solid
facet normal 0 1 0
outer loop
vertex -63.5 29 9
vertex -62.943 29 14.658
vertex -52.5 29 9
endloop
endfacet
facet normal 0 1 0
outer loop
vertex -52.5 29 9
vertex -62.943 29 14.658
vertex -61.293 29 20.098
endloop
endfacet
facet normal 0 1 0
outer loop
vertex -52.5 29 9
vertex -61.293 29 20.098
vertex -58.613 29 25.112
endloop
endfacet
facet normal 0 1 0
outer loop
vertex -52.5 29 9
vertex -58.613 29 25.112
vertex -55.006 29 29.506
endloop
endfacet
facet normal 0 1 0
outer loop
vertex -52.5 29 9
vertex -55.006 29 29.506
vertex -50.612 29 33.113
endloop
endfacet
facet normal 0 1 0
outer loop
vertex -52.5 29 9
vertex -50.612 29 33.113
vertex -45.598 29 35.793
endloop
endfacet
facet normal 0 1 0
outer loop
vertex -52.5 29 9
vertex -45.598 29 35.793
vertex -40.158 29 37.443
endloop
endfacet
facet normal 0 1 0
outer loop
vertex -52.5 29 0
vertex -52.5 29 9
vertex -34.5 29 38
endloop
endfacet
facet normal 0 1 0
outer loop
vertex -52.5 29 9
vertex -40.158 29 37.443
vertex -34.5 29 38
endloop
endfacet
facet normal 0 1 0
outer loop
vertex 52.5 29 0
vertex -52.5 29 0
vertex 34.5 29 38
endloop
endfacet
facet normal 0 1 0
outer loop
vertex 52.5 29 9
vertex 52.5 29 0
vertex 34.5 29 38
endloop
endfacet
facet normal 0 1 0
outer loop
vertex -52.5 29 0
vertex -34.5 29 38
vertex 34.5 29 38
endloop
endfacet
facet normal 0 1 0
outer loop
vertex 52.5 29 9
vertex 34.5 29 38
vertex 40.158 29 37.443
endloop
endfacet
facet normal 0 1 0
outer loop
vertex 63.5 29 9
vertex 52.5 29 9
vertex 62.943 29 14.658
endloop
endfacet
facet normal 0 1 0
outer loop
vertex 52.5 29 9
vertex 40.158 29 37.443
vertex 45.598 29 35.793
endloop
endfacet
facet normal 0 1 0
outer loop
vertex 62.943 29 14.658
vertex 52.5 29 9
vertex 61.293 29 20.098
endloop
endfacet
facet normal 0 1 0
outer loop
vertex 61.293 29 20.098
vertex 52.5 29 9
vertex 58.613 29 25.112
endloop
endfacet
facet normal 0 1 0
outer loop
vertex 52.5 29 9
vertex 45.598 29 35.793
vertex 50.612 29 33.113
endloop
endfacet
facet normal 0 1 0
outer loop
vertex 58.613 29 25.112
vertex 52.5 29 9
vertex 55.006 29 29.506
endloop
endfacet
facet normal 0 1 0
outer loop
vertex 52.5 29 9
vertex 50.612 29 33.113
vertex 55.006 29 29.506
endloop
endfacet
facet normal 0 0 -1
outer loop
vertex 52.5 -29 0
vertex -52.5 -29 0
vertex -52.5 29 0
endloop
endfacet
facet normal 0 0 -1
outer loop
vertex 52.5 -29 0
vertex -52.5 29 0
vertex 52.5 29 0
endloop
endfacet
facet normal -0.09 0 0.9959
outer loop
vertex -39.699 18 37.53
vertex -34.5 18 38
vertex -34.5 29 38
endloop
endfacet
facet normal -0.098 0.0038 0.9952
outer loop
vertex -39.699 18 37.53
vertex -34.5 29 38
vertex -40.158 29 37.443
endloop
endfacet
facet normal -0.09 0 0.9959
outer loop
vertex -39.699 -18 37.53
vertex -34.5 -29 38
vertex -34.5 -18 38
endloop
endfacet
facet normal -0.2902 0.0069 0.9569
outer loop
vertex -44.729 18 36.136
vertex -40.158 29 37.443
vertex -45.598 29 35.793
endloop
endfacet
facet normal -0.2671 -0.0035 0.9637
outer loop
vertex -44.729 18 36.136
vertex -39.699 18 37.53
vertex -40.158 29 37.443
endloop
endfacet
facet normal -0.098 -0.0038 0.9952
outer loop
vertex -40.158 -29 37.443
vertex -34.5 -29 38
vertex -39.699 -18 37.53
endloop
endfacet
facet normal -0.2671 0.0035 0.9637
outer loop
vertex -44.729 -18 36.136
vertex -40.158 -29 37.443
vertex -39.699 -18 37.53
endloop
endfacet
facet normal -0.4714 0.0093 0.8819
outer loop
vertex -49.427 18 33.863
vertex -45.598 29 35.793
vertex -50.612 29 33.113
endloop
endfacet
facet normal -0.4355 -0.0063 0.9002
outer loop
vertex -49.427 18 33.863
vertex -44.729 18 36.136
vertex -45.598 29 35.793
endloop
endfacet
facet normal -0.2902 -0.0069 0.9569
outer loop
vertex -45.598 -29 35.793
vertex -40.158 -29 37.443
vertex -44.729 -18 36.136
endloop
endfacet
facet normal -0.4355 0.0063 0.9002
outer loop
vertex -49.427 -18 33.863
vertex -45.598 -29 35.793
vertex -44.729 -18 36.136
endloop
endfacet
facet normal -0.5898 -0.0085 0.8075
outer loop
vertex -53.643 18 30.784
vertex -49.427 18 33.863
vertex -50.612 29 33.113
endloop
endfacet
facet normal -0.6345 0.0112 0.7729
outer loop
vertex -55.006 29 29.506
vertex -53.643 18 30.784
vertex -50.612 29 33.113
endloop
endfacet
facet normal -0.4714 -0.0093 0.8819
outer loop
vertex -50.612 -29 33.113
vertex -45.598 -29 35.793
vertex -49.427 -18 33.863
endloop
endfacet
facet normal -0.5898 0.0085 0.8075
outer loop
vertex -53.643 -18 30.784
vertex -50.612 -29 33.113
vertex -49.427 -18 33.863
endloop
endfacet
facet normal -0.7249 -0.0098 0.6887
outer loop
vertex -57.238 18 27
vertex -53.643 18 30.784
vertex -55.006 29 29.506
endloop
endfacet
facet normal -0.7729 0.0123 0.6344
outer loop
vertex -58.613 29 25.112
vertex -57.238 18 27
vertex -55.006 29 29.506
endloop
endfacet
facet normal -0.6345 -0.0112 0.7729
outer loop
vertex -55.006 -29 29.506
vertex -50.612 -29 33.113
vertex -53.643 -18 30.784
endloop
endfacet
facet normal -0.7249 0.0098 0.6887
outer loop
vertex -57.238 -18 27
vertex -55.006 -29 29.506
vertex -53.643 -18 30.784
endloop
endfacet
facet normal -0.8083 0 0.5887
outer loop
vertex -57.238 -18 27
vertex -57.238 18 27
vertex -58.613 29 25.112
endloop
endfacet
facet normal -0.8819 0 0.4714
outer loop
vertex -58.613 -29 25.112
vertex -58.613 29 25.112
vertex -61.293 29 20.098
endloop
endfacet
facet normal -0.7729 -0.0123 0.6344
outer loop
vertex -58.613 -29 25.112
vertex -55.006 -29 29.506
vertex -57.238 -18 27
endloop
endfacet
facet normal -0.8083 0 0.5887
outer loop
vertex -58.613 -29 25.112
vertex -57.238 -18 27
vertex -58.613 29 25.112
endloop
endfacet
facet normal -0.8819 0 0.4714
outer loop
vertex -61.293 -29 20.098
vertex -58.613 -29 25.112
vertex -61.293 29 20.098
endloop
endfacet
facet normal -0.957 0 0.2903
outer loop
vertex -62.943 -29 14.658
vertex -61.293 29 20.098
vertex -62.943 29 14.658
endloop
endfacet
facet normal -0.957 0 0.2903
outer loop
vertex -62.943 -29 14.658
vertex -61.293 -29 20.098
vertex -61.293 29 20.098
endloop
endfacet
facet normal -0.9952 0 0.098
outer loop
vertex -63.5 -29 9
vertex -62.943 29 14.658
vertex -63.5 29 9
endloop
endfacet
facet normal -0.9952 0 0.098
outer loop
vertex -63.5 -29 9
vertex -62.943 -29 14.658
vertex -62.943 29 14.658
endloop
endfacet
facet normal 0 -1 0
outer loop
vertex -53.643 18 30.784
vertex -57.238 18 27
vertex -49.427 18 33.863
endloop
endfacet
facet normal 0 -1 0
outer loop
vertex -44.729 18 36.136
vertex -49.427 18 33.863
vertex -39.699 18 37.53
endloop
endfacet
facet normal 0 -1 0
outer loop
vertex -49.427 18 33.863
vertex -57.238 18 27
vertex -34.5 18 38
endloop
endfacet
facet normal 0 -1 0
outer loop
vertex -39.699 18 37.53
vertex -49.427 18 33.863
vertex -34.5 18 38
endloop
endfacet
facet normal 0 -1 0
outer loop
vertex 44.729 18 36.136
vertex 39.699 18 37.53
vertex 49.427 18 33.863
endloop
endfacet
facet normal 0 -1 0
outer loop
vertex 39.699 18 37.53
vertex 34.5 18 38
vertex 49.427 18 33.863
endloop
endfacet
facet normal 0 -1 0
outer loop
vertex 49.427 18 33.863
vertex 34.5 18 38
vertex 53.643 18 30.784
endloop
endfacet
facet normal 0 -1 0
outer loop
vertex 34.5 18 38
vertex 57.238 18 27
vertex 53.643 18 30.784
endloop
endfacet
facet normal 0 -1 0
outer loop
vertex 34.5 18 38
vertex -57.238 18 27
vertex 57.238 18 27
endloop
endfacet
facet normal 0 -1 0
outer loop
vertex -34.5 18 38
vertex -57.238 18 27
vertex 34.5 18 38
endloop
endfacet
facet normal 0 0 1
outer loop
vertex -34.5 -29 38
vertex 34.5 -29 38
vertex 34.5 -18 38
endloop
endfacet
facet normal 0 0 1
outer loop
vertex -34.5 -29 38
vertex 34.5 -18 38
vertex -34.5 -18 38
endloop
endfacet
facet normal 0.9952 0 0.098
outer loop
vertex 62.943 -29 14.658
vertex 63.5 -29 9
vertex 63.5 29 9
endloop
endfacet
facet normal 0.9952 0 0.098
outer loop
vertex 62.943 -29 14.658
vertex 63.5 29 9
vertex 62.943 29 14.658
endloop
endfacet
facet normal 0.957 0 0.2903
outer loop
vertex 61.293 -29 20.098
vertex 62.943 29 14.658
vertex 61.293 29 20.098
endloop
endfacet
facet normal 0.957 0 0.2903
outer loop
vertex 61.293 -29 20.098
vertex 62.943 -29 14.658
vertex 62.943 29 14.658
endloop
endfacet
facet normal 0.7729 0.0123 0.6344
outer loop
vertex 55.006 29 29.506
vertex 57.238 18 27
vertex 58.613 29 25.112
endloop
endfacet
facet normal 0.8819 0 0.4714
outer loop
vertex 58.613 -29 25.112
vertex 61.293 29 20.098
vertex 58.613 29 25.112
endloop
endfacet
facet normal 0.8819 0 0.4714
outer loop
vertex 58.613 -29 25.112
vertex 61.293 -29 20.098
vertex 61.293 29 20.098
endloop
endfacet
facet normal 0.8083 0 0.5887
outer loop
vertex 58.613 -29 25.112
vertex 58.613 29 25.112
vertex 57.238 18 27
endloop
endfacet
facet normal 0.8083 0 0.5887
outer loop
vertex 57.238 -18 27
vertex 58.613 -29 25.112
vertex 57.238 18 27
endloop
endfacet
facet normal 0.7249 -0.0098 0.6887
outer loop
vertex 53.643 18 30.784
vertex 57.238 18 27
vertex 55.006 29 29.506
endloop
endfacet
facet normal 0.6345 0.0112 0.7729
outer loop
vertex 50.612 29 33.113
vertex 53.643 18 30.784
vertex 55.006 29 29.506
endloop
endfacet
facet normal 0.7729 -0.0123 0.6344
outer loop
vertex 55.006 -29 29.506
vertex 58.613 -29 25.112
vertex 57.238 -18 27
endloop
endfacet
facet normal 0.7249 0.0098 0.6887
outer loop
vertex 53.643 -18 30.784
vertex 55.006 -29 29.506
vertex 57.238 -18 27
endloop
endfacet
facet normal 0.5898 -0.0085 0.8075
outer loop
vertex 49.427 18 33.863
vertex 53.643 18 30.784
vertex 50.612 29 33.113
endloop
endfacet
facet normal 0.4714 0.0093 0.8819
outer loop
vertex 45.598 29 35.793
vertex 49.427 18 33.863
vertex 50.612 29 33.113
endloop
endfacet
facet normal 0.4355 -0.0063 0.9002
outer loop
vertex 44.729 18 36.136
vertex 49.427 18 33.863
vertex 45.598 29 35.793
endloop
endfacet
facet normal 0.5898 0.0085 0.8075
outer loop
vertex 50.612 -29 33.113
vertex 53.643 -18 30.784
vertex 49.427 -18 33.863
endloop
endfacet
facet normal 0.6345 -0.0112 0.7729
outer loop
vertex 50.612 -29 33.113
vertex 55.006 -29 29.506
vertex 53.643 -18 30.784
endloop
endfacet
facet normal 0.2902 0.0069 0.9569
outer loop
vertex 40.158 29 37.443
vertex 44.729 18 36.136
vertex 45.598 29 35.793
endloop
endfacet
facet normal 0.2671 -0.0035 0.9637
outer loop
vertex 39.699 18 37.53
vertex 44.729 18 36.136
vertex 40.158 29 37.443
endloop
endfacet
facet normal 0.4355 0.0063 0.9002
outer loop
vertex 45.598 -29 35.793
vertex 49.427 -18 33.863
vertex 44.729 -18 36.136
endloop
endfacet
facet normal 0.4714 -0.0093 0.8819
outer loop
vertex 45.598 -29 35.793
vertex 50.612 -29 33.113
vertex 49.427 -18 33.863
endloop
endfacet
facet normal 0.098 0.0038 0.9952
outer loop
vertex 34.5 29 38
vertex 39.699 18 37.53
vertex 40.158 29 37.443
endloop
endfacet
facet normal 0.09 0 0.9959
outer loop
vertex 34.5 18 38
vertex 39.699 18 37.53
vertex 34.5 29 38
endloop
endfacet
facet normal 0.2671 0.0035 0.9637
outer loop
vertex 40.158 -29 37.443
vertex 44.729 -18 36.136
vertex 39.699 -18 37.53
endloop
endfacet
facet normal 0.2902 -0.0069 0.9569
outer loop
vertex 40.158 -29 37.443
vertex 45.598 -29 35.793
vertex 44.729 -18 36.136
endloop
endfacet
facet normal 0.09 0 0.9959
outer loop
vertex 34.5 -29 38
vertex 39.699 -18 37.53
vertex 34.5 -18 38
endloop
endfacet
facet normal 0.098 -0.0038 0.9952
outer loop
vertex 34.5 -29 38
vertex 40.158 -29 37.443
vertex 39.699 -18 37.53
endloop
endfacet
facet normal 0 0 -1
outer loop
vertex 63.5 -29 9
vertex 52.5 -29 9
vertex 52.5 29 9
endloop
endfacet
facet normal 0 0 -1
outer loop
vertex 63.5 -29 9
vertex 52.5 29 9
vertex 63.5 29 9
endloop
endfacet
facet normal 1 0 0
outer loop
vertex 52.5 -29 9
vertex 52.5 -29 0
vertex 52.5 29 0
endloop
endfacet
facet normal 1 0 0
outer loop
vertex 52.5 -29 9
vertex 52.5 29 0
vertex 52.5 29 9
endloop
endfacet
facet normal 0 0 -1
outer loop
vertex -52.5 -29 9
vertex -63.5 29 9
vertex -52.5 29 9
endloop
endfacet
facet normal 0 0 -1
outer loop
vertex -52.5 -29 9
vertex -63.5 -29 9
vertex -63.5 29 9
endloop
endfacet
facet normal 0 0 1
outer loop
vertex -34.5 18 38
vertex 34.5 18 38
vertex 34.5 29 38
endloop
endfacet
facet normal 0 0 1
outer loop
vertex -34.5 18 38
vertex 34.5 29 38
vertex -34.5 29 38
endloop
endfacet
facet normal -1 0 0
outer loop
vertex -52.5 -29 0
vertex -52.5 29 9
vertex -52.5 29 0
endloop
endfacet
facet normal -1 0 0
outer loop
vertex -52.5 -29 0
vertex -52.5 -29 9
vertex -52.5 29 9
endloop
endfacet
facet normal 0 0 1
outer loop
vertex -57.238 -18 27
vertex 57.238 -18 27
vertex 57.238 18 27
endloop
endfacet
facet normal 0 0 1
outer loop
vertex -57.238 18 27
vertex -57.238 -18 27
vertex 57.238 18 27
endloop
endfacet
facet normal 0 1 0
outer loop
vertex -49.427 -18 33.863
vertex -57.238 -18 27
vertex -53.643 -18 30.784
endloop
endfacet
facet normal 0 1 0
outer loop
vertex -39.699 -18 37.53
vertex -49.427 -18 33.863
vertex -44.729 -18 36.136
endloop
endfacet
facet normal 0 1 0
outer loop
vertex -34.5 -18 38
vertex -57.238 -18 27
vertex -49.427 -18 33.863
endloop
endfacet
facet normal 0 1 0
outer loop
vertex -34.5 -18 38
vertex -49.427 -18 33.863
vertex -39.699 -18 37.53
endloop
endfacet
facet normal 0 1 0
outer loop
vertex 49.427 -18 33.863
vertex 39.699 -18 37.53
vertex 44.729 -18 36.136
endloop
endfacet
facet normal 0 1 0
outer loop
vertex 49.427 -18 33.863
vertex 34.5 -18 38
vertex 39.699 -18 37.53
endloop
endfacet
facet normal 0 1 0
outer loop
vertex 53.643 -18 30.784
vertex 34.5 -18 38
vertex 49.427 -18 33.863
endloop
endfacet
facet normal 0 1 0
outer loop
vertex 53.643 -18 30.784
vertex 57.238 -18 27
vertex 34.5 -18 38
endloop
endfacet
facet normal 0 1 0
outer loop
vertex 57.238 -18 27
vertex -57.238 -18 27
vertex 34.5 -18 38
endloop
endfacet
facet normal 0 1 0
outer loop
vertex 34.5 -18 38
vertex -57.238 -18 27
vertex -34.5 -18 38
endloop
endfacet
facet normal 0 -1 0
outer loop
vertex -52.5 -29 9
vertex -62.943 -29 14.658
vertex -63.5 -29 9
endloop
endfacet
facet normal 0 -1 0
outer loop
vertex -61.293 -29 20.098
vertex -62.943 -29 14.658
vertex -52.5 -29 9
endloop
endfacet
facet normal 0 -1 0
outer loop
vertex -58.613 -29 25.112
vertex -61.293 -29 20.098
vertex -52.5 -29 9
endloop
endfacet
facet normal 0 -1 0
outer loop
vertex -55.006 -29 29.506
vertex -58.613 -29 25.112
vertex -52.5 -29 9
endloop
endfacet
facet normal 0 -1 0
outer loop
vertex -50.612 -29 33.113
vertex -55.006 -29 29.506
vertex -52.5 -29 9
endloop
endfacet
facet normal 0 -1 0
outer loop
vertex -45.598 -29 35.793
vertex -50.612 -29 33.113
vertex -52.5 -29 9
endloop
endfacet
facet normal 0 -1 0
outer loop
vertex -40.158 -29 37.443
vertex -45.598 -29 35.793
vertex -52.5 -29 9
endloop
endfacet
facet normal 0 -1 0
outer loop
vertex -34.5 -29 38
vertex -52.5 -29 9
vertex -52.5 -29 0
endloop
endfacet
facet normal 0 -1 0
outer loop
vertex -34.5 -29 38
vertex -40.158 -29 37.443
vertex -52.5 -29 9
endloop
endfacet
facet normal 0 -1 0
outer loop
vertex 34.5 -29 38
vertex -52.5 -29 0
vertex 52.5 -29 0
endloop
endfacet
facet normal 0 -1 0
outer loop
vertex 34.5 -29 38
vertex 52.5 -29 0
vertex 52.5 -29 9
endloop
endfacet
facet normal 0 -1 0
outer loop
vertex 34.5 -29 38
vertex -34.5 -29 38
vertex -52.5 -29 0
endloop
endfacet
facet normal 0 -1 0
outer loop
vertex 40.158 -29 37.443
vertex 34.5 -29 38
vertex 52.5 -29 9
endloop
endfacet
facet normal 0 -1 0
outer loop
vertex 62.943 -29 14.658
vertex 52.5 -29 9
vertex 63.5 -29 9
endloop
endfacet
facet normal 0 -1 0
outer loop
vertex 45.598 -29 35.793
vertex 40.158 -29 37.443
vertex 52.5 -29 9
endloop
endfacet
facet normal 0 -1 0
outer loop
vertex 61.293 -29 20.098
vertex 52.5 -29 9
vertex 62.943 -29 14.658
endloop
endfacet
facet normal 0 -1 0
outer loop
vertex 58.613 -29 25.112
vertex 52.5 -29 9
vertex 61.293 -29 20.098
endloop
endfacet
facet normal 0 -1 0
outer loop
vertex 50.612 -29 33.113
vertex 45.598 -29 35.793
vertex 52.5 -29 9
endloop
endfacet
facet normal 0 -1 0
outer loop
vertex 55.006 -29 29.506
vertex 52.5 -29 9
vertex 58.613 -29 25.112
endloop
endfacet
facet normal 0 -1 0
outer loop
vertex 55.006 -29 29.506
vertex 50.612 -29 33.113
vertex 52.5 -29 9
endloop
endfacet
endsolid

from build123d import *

# Parameters (mm, degrees)
F1_DEPTH = 29
F2_W     = 36
F2_H     = 11
F3_DEPTH = 63.5


with BuildPart() as f1:
    # F0 (on Front) → F1 (new body, symmetric)
    with BuildSketch(Plane.XZ):
        with BuildLine():
            Line((-52.5, 9), (-52.5, 0))
            Line((-52.5, 0), (52.5, 0))
            Line((52.5, 0), (52.5, 9))
            Line((52.5, 9), (63.5, 9))
            ThreePointArc((63.5, 9), (55.006097, 29.506097), (34.5, 38))
            Line((34.5, 38), (-34.5, 38))
            ThreePointArc((-34.5, 38), (-55.006097, 29.506097), (-63.5, 9))
            Line((-63.5, 9), (-52.5, 9))
        make_face()
    extrude(amount=F1_DEPTH, both=True)

    # F2 (on Right) → F3 (cut, symmetric)
    with BuildSketch(Plane.YZ):
        with Locations((0, 32.5)):
            Rectangle(F2_W, F2_H)
    extrude(amount=F3_DEPTH, both=True, mode=Mode.SUBTRACT)


solid = f1.part
